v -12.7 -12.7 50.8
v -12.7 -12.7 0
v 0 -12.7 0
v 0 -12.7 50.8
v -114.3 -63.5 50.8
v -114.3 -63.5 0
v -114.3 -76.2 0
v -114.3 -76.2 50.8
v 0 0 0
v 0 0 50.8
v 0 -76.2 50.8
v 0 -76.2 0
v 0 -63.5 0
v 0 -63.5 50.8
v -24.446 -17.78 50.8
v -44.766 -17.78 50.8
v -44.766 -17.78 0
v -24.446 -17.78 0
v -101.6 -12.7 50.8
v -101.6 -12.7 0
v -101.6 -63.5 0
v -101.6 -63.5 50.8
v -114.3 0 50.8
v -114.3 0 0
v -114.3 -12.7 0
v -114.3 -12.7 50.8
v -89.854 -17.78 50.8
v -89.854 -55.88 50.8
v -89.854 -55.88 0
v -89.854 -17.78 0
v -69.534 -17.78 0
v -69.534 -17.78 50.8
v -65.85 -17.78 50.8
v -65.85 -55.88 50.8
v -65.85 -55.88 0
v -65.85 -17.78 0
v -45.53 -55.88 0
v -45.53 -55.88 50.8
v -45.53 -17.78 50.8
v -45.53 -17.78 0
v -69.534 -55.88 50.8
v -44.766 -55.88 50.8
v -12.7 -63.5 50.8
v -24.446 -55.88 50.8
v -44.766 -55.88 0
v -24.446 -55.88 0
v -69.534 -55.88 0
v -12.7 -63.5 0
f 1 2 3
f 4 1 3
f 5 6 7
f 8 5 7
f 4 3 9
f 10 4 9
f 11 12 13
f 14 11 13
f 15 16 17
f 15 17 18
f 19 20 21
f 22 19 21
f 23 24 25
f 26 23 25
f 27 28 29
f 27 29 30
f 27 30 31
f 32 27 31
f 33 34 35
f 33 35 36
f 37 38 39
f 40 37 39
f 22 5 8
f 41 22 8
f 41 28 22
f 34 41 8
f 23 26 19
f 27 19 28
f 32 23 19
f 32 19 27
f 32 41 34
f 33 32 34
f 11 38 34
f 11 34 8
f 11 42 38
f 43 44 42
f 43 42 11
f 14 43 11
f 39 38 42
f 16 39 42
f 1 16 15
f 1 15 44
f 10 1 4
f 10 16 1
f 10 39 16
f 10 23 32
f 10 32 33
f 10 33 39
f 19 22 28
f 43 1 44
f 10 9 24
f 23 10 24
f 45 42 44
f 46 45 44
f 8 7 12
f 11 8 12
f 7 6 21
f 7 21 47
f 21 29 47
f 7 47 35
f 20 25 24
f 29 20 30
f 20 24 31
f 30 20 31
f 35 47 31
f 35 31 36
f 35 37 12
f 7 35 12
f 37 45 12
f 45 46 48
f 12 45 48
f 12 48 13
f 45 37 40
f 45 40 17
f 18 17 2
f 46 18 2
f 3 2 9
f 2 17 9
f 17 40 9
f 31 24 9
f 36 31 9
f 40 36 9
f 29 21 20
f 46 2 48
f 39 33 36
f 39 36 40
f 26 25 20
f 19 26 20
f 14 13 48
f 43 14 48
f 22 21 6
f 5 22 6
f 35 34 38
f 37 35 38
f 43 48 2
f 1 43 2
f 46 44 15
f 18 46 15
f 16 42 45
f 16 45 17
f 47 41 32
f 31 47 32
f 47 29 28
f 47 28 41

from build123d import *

# Parameters (mm, degrees)
F1_DEPTH = 50.8
F2_W     = 20.32
F2_H     = 38.1
F3_DEPTH = 50.8


with BuildPart() as f1:
    # F0 (on Top) → F1 (new body)
    with BuildSketch(Plane.XY):
        Polygon((0, 0), (-114.3, 0), (-114.3, -12.7), (-101.6, -12.7), (-101.6, -63.5), (-114.3, -63.5), (-114.3, -76.2), (0, -76.2), (0, -63.5), (-12.7, -63.5), (-12.7, -12.7), (0, -12.7), align=None)
    extrude(amount=F1_DEPTH)

    # F2 (on face) → F3 (cut)
    with BuildSketch(Plane.XY.offset(50.8)):
        with Locations((-34.606382, -36.83)):
            Rectangle(F2_W, F2_H)
        with Locations((-55.689771, -36.83)):
            Rectangle(F2_W, F2_H)
        with Locations((-79.693612, -36.83)):
            Rectangle(F2_W, F2_H)
    extrude(amount=-F3_DEPTH, mode=Mode.SUBTRACT)


solid = f1.part
